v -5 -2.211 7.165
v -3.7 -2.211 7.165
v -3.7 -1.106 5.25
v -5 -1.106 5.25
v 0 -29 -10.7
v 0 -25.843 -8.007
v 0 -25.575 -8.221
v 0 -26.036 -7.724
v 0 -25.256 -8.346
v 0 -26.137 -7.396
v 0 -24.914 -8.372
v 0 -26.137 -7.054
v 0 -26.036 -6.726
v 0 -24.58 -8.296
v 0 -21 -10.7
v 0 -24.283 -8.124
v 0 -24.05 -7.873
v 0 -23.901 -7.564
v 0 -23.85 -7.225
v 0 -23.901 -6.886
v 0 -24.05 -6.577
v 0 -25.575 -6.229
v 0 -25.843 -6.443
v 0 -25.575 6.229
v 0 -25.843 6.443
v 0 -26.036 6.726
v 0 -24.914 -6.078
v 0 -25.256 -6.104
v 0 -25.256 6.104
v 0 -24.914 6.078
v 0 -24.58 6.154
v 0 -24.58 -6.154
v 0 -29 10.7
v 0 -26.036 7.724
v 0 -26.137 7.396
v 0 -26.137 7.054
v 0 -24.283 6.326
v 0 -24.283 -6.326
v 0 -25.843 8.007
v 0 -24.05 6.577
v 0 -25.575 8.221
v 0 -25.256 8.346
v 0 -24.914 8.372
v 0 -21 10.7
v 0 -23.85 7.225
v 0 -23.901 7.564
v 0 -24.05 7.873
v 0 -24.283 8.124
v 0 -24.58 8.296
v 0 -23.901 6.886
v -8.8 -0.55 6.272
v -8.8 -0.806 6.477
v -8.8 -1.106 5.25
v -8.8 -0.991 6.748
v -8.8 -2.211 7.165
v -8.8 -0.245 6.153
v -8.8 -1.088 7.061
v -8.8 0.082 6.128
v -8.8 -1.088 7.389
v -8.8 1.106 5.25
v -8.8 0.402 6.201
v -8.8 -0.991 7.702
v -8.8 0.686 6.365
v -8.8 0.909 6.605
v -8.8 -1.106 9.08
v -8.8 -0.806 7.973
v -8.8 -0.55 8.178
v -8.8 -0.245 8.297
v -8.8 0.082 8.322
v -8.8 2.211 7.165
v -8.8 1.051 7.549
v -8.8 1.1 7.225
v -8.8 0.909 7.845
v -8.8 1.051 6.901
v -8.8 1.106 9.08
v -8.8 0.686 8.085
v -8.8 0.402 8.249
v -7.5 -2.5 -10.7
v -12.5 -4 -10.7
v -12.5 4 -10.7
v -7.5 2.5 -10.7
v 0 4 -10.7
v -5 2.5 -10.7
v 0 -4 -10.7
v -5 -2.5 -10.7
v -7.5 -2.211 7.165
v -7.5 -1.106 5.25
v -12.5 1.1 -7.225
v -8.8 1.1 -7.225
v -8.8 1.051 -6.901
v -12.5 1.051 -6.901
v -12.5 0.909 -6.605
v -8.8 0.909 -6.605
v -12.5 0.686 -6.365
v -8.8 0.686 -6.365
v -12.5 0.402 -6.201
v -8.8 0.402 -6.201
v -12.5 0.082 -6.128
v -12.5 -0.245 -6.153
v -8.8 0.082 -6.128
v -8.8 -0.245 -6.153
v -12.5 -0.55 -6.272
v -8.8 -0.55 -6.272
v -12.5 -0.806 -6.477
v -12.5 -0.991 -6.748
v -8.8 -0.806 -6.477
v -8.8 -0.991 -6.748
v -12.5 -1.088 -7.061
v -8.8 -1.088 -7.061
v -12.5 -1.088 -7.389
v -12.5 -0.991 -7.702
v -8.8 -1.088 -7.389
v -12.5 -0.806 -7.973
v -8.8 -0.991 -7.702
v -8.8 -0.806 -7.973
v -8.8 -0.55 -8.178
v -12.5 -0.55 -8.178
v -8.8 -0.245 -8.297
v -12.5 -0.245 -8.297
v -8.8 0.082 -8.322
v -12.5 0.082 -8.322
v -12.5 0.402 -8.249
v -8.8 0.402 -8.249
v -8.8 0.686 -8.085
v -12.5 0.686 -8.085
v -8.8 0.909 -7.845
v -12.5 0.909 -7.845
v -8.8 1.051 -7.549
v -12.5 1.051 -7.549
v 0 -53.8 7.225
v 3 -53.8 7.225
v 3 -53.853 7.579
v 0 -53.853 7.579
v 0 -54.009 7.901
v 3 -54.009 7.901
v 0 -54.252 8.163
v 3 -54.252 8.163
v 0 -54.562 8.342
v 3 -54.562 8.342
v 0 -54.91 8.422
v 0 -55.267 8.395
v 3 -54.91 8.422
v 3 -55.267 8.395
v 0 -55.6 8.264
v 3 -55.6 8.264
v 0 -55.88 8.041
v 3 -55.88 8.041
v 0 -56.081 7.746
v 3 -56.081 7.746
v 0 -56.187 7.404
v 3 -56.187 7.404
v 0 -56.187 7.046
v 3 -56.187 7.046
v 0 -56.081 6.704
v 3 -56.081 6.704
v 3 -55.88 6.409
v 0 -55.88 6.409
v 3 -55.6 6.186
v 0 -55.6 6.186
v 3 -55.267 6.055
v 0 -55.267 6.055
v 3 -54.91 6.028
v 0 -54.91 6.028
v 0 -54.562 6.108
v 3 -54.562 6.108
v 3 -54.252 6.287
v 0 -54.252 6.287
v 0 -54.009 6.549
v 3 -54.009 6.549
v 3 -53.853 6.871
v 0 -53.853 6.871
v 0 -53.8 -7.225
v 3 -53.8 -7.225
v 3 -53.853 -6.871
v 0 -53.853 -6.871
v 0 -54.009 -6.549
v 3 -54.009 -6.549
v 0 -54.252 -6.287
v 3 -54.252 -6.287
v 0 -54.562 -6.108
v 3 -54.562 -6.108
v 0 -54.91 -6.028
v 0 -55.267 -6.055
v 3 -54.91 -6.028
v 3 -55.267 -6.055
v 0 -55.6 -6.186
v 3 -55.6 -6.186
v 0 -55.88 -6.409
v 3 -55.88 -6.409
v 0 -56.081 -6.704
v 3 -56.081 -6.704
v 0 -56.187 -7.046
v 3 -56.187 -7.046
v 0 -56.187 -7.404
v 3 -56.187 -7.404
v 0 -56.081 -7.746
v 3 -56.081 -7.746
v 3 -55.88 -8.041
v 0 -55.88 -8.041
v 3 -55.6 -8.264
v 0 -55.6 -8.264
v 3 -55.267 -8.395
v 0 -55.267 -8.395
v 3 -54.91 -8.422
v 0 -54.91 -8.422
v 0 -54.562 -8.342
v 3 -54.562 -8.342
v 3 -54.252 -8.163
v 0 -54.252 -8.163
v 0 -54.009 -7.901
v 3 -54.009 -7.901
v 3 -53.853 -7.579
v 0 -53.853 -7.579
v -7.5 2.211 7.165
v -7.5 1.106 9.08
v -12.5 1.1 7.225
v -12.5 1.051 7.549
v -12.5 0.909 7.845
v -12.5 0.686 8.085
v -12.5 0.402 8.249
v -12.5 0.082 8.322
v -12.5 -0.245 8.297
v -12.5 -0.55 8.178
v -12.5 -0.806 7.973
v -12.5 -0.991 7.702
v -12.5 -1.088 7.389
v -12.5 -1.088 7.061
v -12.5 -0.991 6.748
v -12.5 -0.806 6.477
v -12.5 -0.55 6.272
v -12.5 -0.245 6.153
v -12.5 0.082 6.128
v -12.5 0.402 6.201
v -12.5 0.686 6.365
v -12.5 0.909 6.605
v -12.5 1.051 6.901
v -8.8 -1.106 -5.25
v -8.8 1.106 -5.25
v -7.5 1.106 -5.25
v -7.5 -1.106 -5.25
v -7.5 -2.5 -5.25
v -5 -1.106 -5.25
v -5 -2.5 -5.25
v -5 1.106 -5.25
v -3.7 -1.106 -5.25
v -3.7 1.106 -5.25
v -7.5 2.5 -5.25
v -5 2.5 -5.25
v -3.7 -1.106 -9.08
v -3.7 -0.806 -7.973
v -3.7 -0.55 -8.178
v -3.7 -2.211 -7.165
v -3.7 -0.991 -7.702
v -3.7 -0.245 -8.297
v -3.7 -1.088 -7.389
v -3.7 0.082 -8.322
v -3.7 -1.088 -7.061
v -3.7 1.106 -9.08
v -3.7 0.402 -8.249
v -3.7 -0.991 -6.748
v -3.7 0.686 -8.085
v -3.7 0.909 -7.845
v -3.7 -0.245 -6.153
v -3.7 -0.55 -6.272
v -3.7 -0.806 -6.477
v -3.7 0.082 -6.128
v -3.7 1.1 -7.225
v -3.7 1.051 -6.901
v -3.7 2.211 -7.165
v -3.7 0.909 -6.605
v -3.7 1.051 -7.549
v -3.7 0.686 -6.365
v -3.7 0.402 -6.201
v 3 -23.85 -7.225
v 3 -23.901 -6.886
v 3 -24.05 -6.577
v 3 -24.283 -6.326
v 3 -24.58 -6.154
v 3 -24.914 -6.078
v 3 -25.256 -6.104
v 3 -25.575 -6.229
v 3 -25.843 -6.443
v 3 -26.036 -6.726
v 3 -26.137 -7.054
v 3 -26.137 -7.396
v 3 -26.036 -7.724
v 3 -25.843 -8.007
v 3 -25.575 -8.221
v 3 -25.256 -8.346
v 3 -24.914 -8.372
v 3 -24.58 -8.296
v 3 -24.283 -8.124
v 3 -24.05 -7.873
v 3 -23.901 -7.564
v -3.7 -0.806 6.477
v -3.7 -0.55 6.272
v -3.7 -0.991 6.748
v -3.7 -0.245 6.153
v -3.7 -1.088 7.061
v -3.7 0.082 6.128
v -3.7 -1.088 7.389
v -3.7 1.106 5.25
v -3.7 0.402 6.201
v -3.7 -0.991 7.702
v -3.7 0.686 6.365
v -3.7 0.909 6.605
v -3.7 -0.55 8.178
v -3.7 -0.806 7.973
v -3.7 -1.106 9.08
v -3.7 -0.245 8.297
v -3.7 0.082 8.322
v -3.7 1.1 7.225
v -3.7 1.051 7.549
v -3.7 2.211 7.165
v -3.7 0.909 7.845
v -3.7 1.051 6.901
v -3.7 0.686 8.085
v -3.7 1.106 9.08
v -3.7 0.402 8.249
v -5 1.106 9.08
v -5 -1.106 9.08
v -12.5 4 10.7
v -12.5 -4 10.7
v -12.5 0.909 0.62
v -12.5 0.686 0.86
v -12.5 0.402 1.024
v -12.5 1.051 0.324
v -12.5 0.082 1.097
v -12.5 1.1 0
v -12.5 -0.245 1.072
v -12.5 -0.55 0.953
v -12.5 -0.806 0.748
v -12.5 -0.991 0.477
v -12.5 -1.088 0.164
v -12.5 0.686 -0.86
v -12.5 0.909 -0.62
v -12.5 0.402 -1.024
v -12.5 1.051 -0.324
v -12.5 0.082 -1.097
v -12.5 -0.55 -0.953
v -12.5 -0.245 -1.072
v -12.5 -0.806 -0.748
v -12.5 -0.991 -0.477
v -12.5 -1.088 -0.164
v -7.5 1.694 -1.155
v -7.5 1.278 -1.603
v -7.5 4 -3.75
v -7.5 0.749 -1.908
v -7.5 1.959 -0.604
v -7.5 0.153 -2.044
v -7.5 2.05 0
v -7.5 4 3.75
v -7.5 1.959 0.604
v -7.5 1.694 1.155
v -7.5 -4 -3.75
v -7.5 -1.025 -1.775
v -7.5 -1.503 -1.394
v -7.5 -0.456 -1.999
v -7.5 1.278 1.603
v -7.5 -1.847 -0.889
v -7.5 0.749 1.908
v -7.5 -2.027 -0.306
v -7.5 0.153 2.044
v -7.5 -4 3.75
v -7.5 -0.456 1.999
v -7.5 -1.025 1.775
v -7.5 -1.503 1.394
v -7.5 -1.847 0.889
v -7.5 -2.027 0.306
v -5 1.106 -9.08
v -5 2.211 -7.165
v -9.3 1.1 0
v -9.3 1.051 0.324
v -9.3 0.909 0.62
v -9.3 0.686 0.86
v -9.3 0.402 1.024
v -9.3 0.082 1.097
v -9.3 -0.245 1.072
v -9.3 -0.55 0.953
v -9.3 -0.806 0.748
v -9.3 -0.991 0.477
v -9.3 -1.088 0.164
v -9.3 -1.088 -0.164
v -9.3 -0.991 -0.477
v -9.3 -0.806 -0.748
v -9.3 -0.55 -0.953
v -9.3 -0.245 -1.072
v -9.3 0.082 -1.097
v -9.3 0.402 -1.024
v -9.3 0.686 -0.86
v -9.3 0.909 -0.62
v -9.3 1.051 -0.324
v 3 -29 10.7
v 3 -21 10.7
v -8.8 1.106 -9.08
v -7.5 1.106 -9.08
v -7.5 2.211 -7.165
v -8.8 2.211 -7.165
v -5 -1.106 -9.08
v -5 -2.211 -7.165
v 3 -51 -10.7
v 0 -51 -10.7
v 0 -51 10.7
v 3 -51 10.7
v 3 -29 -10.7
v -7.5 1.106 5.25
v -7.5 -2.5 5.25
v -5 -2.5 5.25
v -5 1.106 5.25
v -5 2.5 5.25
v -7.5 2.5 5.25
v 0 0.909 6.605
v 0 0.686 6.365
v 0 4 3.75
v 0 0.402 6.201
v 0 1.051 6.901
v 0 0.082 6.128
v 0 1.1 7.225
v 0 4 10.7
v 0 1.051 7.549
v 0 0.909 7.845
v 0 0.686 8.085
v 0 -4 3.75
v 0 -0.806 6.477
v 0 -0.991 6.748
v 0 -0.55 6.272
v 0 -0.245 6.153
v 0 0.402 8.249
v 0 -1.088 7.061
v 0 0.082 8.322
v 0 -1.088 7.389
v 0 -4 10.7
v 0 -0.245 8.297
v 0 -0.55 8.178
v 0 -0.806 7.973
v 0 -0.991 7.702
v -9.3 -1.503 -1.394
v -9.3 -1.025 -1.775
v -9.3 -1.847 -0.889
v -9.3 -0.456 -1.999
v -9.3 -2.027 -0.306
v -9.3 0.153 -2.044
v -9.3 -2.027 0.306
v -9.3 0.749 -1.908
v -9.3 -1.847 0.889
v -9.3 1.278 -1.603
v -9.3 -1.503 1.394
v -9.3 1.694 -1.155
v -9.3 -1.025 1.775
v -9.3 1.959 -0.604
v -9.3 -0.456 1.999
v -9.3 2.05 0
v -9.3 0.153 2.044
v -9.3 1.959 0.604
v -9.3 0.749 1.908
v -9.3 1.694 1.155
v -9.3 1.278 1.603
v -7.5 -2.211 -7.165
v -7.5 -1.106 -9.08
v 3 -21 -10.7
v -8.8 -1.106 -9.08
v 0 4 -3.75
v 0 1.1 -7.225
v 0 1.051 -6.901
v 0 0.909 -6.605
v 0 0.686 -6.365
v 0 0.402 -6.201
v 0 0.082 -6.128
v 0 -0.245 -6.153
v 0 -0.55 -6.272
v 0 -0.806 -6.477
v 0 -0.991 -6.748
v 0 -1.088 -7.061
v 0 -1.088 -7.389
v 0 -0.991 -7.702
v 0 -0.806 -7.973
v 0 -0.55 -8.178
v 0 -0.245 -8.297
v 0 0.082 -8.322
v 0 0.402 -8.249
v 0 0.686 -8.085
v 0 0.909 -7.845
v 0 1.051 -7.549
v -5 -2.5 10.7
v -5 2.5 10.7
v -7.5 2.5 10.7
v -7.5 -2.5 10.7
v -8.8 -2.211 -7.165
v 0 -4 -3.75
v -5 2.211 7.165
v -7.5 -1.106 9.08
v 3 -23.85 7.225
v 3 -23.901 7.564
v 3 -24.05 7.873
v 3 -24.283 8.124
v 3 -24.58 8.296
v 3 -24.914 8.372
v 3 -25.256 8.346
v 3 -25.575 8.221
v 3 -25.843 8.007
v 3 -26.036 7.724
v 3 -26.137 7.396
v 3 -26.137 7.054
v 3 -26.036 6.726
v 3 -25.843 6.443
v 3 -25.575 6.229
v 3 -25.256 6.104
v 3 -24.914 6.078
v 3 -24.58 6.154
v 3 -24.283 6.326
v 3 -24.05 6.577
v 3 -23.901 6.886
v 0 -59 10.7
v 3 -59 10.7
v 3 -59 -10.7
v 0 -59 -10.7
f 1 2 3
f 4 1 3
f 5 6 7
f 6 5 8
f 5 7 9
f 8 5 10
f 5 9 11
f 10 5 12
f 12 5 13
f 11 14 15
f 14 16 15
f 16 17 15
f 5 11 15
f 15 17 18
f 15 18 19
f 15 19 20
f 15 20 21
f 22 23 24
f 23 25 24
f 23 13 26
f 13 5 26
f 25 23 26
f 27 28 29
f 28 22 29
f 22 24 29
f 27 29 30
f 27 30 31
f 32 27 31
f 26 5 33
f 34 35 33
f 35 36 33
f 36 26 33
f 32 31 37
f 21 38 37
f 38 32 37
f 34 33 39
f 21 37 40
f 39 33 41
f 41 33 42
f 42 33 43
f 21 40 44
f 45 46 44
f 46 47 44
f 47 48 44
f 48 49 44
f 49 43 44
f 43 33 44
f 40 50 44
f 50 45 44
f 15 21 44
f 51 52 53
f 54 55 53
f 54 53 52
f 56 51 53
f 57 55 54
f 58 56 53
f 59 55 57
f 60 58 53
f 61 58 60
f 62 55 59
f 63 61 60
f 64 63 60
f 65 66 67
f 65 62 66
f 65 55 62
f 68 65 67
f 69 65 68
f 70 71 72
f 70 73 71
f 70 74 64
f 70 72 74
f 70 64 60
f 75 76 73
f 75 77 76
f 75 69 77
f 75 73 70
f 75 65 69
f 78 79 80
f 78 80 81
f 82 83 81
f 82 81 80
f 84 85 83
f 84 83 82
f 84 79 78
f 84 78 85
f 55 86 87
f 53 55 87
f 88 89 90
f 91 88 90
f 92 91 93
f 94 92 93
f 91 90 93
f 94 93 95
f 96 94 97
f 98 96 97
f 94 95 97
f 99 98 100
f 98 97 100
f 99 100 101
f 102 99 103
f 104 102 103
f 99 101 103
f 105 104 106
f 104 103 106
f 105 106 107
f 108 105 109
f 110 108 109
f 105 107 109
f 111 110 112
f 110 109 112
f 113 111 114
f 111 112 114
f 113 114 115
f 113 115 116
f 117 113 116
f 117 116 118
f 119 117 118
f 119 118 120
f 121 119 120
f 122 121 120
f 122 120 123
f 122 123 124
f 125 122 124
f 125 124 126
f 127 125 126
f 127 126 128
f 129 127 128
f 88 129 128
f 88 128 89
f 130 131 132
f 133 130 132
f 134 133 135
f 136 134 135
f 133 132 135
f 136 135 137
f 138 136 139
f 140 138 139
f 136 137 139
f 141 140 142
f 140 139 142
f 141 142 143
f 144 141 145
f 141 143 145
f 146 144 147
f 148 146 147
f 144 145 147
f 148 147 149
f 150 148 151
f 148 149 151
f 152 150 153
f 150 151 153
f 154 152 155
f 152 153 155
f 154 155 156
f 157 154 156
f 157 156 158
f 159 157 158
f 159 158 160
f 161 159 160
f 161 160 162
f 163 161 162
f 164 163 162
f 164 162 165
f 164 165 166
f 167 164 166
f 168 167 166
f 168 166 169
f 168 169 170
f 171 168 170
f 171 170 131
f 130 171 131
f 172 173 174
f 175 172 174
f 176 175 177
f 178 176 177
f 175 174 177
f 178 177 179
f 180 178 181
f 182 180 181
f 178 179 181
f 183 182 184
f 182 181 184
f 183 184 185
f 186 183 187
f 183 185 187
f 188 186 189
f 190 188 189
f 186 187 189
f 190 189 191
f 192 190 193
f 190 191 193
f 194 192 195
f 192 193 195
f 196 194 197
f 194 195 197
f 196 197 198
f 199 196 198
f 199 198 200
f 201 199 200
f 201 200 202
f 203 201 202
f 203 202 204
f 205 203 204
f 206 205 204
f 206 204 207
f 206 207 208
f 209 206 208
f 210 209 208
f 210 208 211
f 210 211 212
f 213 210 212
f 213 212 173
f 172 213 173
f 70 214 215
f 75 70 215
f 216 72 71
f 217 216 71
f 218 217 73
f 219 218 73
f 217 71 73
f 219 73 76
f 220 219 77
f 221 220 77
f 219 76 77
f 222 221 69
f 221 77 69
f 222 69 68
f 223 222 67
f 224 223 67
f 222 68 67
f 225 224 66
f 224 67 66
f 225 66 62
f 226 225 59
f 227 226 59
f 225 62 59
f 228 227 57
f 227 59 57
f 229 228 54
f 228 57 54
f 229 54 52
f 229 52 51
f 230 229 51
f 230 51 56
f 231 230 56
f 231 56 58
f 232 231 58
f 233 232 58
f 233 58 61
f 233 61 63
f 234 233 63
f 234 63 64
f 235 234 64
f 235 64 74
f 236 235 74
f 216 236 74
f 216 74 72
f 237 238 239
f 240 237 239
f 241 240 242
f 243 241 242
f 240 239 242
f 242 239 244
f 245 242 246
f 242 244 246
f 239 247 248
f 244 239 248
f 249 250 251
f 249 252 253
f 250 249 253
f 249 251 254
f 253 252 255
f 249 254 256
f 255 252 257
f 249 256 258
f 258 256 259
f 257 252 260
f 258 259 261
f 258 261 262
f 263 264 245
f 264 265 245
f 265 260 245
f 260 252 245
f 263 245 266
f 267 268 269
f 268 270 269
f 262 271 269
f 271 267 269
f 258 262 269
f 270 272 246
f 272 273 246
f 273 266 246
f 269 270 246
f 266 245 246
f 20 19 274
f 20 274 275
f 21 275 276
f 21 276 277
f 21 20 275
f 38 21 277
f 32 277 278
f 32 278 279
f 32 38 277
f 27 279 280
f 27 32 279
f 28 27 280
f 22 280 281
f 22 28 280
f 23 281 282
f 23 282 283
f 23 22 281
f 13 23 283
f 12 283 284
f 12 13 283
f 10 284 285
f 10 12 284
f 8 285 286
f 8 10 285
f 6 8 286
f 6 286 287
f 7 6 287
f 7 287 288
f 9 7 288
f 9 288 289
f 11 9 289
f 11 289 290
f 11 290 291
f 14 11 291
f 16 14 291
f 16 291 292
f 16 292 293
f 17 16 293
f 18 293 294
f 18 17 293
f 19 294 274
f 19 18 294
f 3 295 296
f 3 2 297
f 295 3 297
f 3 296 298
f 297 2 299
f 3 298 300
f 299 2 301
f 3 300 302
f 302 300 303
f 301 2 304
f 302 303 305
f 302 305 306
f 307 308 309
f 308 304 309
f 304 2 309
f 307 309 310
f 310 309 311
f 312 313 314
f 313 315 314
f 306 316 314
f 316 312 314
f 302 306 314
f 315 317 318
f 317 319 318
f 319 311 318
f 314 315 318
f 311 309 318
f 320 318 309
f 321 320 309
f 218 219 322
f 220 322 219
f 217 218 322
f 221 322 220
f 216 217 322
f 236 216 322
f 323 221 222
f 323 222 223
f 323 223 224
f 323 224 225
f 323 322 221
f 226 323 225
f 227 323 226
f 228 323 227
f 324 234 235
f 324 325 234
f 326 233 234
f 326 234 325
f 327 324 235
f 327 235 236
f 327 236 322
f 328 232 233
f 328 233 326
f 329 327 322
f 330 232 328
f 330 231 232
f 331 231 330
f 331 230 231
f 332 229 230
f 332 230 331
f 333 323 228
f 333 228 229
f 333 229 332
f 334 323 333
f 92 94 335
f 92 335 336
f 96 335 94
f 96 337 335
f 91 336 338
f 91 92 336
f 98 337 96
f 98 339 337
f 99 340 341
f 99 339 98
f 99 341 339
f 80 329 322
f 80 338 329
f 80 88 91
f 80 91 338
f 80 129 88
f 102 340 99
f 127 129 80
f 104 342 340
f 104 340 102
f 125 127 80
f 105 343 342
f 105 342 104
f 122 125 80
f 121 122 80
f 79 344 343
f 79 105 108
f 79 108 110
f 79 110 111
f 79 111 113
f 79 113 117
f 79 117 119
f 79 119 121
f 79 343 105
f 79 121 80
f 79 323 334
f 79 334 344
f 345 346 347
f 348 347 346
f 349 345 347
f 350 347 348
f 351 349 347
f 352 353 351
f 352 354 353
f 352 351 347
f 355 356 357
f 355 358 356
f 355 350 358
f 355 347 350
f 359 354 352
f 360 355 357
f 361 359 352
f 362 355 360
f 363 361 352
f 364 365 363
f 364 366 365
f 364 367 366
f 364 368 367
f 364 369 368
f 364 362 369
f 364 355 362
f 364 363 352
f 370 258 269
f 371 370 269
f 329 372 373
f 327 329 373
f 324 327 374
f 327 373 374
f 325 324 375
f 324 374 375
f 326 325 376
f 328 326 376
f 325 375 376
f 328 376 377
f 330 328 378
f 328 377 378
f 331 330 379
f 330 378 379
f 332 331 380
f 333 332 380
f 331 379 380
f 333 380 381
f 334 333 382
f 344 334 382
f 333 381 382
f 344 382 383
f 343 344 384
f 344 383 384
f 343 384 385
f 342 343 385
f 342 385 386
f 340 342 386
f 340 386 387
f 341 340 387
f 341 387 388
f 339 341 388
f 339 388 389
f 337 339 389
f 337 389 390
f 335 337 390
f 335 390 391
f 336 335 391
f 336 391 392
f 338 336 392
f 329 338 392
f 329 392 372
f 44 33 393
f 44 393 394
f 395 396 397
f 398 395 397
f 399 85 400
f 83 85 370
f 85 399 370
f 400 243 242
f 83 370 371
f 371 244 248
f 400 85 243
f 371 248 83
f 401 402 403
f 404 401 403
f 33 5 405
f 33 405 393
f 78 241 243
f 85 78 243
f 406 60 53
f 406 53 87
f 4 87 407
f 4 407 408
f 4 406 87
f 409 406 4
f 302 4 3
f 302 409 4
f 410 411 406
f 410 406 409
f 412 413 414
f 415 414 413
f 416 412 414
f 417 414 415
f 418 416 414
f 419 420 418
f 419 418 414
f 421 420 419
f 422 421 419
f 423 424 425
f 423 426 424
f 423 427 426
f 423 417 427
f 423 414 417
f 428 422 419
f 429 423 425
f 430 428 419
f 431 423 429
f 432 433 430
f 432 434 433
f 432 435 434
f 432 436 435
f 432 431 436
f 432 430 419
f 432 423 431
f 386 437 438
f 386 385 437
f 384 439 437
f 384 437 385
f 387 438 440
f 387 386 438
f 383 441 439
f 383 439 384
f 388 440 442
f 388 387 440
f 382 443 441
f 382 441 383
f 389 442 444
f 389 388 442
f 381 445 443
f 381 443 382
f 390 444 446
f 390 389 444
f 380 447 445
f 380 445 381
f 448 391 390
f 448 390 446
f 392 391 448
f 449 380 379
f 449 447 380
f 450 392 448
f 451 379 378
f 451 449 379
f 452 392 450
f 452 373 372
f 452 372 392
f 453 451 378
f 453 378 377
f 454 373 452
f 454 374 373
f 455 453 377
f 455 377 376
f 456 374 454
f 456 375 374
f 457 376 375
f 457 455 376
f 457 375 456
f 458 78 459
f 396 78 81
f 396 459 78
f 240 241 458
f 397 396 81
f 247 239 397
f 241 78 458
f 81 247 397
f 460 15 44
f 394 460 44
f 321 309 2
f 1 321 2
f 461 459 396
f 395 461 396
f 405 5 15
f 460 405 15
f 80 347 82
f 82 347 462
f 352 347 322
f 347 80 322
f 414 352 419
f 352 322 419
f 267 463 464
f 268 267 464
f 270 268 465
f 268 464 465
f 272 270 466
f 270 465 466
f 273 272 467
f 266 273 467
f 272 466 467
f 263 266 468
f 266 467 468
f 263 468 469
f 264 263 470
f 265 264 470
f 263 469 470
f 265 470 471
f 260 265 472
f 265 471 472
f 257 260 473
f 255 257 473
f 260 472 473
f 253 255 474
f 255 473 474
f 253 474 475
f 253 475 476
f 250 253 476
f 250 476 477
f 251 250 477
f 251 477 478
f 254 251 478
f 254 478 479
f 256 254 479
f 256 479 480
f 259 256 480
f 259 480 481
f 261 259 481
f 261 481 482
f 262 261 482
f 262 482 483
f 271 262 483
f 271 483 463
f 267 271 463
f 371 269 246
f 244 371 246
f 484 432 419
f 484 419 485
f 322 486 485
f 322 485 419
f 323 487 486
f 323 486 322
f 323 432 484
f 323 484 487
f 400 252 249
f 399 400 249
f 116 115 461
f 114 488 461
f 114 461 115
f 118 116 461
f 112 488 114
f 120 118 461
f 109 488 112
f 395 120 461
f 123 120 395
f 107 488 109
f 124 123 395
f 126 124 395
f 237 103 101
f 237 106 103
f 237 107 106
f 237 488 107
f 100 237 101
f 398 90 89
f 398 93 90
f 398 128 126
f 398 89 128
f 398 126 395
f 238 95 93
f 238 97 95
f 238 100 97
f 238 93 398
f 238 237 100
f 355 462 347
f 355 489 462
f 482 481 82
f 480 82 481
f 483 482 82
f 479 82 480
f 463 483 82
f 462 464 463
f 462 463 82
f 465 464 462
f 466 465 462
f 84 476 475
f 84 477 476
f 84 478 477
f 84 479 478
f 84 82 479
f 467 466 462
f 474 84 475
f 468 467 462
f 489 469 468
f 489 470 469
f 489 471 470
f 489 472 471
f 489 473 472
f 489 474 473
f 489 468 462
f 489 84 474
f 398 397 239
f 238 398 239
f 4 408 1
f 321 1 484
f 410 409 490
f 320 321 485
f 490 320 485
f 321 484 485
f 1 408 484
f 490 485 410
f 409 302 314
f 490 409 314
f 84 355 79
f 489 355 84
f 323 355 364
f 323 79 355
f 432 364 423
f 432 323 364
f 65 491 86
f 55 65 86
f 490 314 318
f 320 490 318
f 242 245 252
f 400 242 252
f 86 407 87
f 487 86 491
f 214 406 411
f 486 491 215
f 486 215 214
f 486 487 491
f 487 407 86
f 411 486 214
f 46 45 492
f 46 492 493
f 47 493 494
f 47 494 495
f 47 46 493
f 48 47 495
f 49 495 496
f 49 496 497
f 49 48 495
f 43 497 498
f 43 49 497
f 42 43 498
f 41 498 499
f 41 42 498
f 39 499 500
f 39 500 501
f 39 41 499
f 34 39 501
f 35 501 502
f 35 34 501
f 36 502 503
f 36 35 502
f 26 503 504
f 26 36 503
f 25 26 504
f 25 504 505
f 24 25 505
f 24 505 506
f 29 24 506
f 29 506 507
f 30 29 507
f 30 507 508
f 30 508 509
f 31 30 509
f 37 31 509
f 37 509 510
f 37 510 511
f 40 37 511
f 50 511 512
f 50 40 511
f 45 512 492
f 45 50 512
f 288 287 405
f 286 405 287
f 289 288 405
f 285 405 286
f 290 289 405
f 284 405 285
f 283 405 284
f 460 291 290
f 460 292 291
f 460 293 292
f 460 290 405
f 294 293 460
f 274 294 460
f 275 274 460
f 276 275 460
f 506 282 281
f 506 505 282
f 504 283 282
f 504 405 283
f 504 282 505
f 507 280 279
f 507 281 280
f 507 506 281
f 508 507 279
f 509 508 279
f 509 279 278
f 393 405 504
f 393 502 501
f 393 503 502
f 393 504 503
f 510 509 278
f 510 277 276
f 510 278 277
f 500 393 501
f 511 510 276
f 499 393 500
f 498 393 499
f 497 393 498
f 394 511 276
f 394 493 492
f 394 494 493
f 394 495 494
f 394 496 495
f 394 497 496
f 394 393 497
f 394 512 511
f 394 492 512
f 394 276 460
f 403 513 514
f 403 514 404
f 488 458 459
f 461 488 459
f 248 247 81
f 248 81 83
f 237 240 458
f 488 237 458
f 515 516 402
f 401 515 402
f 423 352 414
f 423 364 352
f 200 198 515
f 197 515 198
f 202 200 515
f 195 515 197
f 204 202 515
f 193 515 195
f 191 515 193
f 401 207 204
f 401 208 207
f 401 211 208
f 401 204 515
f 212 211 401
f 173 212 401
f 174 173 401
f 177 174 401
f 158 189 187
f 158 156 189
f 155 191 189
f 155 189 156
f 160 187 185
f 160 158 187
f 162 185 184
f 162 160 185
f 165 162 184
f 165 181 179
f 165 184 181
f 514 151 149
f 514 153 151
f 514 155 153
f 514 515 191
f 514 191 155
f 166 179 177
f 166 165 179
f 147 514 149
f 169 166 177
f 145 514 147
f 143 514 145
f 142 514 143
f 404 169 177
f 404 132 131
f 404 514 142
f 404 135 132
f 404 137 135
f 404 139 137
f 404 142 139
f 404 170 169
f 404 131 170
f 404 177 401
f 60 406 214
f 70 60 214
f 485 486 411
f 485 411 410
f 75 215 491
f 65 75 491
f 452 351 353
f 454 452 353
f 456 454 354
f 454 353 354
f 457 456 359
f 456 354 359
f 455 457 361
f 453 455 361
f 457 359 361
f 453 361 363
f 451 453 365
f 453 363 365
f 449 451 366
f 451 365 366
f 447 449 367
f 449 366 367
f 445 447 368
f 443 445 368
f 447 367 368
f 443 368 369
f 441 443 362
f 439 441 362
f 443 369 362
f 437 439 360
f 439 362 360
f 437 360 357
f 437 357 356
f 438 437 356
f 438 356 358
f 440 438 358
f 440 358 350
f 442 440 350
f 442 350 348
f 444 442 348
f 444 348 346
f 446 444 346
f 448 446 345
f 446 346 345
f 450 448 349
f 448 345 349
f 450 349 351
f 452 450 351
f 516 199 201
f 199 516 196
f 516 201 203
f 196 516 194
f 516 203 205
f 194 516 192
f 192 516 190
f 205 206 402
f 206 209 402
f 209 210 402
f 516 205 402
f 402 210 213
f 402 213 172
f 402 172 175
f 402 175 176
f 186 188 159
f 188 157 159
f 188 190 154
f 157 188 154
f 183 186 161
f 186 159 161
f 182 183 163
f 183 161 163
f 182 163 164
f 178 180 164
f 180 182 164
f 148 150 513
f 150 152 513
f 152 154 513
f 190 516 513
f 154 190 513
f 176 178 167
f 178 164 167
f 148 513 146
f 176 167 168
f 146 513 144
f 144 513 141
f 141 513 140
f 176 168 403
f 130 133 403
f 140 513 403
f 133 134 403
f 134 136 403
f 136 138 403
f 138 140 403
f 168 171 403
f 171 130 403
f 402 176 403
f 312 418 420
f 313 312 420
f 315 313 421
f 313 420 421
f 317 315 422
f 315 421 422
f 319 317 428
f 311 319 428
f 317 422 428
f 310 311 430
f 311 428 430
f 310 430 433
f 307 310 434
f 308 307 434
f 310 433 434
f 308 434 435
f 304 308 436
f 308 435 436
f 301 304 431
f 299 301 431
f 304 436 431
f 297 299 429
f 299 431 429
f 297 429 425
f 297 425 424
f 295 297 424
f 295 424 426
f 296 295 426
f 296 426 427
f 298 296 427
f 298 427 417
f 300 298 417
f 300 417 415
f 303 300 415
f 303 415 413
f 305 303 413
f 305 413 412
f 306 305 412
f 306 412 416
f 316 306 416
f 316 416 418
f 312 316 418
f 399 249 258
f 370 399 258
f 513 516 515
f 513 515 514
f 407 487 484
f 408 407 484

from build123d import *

# Parameters (mm, degrees)
F2_DEPTH  = 4
F4_START  = -3.7
F4_DEPTH  = 1.7
F5_W      = 2.5
F5_H      = 5
F6_DEPTH  = 5.45
F7_R      = 1.1
F8_DEPTH  = 12.501
F9_START  = -15.95
F9_DEPTH  = 5.45
F10_START = -7.1
F10_DEPTH = 1.7
F11_R     = 1.1
F13_DEPTH = 5
F12_R     = 2.05
F14_DEPTH = 1.8
F16_W     = 8
F16_H     = 21.4
F16_R     = 1.15
F17_DEPTH = 3
F20_R     = 1.2
F21_DEPTH = 15.501


with BuildPart() as f2:
    # F1 (on Front) → F2 (new body, symmetric)
    with BuildSketch(Plane.XZ):
        Polygon((-7.5, 3.75), (0, 3.75), (0, 10.7), (-12.5, 10.7), (-12.5, -10.7), (0, -10.7), (0, -3.75), (-7.5, -3.75), align=None)
    extrude(amount=F2_DEPTH, both=True)

    # F3 (on face) → F4 (cut)
    with BuildSketch(Plane.YZ.offset(F4_START)):
        Polygon((-1.1056257655, 5.25), (0, 5.25), (1.1056257655, 5.25), (2.211251531, 7.165), (1.1056257655, 9.08), (0, 9.08), (-1.1056257655, 9.08), (-2.211251531, 7.165), align=None)
        Polygon((-2.211251531, -7.165), (-1.1056257655, -9.08), (0, -9.08), (1.1056257655, -9.08), (2.211251531, -7.165), (1.1056257655, -5.25), (0, -5.25), (-1.1056257655, -5.25), align=None)
    extrude(amount=-F4_DEPTH, mode=Mode.SUBTRACT)

    # F5 (on face) → F6 (cut, through all)
    with BuildSketch(Plane.XY.offset(10.7)):
        with Locations((-6.25, 0)):
            Rectangle(F5_W, F5_H)
    extrude(amount=-F6_DEPTH, mode=Mode.SUBTRACT)

    # F7 (on face) → F8 (cut, through all)
    with BuildSketch(Plane.YZ):
        with Locations((0, 7.225)):
            Circle(F7_R)
        with Locations((0, -7.225)):
            Circle(F7_R)
    extrude(amount=-F8_DEPTH, mode=Mode.SUBTRACT)

    # F5 (on face) → F9 (cut)
    with BuildSketch(Plane.XY.offset(10.7).offset(F9_START)):
        with Locations((-6.25, 0)):
            Rectangle(F5_W, F5_H)
    extrude(amount=-F9_DEPTH, mode=Mode.SUBTRACT)

    # F3 (on face) → F10 (cut)
    with BuildSketch(Plane.YZ.offset(F10_START)):
        Polygon((-1.1056257655, 5.25), (0, 5.25), (1.1056257655, 5.25), (2.211251531, 7.165), (1.1056257655, 9.08), (0, 9.08), (-1.1056257655, 9.08), (-2.211251531, 7.165), align=None)
        Polygon((-2.211251531, -7.165), (-1.1056257655, -9.08), (0, -9.08), (1.1056257655, -9.08), (2.211251531, -7.165), (1.1056257655, -5.25), (0, -5.25), (-1.1056257655, -5.25), align=None)
    extrude(amount=-F10_DEPTH, mode=Mode.SUBTRACT)

    # F11 (on face) → F13 (cut, through all)
    with BuildSketch(Plane.YZ.offset(-7.5)):
        Circle(F11_R)
    extrude(amount=-F13_DEPTH, mode=Mode.SUBTRACT)

    # F12 (on face) → F14 (cut)
    with BuildSketch(Plane.YZ.offset(-7.5)):
        Circle(F12_R)
    extrude(amount=-F14_DEPTH, mode=Mode.SUBTRACT)


with BuildPart() as f17:
    # F16 (on Right) → F17 (new body)
    with BuildSketch(Plane.YZ):
        with Locations((-25, 0)):
            Rectangle(F16_W, F16_H)
        with Locations((-25, -7.225)):
            Circle(F16_R, mode=Mode.SUBTRACT)
        with Locations((-25, 7.225)):
            Circle(F16_R, mode=Mode.SUBTRACT)
    extrude(amount=F17_DEPTH)


with BuildPart() as f19_1:
    # F19: copy of F17
    add(f17.part.moved(Location((0, -30, 0))))

    # F20 (on face) → F21 (cut, through all)
    with BuildSketch(Plane.YZ.offset(3)):
        with Locations((-55, 7.225)):
            Circle(F20_R)
        with Locations((-55, -7.225)):
            Circle(F20_R)
    extrude(amount=-F21_DEPTH, mode=Mode.SUBTRACT)


solid = Compound([f2.part, f17.part, f19_1.part])
